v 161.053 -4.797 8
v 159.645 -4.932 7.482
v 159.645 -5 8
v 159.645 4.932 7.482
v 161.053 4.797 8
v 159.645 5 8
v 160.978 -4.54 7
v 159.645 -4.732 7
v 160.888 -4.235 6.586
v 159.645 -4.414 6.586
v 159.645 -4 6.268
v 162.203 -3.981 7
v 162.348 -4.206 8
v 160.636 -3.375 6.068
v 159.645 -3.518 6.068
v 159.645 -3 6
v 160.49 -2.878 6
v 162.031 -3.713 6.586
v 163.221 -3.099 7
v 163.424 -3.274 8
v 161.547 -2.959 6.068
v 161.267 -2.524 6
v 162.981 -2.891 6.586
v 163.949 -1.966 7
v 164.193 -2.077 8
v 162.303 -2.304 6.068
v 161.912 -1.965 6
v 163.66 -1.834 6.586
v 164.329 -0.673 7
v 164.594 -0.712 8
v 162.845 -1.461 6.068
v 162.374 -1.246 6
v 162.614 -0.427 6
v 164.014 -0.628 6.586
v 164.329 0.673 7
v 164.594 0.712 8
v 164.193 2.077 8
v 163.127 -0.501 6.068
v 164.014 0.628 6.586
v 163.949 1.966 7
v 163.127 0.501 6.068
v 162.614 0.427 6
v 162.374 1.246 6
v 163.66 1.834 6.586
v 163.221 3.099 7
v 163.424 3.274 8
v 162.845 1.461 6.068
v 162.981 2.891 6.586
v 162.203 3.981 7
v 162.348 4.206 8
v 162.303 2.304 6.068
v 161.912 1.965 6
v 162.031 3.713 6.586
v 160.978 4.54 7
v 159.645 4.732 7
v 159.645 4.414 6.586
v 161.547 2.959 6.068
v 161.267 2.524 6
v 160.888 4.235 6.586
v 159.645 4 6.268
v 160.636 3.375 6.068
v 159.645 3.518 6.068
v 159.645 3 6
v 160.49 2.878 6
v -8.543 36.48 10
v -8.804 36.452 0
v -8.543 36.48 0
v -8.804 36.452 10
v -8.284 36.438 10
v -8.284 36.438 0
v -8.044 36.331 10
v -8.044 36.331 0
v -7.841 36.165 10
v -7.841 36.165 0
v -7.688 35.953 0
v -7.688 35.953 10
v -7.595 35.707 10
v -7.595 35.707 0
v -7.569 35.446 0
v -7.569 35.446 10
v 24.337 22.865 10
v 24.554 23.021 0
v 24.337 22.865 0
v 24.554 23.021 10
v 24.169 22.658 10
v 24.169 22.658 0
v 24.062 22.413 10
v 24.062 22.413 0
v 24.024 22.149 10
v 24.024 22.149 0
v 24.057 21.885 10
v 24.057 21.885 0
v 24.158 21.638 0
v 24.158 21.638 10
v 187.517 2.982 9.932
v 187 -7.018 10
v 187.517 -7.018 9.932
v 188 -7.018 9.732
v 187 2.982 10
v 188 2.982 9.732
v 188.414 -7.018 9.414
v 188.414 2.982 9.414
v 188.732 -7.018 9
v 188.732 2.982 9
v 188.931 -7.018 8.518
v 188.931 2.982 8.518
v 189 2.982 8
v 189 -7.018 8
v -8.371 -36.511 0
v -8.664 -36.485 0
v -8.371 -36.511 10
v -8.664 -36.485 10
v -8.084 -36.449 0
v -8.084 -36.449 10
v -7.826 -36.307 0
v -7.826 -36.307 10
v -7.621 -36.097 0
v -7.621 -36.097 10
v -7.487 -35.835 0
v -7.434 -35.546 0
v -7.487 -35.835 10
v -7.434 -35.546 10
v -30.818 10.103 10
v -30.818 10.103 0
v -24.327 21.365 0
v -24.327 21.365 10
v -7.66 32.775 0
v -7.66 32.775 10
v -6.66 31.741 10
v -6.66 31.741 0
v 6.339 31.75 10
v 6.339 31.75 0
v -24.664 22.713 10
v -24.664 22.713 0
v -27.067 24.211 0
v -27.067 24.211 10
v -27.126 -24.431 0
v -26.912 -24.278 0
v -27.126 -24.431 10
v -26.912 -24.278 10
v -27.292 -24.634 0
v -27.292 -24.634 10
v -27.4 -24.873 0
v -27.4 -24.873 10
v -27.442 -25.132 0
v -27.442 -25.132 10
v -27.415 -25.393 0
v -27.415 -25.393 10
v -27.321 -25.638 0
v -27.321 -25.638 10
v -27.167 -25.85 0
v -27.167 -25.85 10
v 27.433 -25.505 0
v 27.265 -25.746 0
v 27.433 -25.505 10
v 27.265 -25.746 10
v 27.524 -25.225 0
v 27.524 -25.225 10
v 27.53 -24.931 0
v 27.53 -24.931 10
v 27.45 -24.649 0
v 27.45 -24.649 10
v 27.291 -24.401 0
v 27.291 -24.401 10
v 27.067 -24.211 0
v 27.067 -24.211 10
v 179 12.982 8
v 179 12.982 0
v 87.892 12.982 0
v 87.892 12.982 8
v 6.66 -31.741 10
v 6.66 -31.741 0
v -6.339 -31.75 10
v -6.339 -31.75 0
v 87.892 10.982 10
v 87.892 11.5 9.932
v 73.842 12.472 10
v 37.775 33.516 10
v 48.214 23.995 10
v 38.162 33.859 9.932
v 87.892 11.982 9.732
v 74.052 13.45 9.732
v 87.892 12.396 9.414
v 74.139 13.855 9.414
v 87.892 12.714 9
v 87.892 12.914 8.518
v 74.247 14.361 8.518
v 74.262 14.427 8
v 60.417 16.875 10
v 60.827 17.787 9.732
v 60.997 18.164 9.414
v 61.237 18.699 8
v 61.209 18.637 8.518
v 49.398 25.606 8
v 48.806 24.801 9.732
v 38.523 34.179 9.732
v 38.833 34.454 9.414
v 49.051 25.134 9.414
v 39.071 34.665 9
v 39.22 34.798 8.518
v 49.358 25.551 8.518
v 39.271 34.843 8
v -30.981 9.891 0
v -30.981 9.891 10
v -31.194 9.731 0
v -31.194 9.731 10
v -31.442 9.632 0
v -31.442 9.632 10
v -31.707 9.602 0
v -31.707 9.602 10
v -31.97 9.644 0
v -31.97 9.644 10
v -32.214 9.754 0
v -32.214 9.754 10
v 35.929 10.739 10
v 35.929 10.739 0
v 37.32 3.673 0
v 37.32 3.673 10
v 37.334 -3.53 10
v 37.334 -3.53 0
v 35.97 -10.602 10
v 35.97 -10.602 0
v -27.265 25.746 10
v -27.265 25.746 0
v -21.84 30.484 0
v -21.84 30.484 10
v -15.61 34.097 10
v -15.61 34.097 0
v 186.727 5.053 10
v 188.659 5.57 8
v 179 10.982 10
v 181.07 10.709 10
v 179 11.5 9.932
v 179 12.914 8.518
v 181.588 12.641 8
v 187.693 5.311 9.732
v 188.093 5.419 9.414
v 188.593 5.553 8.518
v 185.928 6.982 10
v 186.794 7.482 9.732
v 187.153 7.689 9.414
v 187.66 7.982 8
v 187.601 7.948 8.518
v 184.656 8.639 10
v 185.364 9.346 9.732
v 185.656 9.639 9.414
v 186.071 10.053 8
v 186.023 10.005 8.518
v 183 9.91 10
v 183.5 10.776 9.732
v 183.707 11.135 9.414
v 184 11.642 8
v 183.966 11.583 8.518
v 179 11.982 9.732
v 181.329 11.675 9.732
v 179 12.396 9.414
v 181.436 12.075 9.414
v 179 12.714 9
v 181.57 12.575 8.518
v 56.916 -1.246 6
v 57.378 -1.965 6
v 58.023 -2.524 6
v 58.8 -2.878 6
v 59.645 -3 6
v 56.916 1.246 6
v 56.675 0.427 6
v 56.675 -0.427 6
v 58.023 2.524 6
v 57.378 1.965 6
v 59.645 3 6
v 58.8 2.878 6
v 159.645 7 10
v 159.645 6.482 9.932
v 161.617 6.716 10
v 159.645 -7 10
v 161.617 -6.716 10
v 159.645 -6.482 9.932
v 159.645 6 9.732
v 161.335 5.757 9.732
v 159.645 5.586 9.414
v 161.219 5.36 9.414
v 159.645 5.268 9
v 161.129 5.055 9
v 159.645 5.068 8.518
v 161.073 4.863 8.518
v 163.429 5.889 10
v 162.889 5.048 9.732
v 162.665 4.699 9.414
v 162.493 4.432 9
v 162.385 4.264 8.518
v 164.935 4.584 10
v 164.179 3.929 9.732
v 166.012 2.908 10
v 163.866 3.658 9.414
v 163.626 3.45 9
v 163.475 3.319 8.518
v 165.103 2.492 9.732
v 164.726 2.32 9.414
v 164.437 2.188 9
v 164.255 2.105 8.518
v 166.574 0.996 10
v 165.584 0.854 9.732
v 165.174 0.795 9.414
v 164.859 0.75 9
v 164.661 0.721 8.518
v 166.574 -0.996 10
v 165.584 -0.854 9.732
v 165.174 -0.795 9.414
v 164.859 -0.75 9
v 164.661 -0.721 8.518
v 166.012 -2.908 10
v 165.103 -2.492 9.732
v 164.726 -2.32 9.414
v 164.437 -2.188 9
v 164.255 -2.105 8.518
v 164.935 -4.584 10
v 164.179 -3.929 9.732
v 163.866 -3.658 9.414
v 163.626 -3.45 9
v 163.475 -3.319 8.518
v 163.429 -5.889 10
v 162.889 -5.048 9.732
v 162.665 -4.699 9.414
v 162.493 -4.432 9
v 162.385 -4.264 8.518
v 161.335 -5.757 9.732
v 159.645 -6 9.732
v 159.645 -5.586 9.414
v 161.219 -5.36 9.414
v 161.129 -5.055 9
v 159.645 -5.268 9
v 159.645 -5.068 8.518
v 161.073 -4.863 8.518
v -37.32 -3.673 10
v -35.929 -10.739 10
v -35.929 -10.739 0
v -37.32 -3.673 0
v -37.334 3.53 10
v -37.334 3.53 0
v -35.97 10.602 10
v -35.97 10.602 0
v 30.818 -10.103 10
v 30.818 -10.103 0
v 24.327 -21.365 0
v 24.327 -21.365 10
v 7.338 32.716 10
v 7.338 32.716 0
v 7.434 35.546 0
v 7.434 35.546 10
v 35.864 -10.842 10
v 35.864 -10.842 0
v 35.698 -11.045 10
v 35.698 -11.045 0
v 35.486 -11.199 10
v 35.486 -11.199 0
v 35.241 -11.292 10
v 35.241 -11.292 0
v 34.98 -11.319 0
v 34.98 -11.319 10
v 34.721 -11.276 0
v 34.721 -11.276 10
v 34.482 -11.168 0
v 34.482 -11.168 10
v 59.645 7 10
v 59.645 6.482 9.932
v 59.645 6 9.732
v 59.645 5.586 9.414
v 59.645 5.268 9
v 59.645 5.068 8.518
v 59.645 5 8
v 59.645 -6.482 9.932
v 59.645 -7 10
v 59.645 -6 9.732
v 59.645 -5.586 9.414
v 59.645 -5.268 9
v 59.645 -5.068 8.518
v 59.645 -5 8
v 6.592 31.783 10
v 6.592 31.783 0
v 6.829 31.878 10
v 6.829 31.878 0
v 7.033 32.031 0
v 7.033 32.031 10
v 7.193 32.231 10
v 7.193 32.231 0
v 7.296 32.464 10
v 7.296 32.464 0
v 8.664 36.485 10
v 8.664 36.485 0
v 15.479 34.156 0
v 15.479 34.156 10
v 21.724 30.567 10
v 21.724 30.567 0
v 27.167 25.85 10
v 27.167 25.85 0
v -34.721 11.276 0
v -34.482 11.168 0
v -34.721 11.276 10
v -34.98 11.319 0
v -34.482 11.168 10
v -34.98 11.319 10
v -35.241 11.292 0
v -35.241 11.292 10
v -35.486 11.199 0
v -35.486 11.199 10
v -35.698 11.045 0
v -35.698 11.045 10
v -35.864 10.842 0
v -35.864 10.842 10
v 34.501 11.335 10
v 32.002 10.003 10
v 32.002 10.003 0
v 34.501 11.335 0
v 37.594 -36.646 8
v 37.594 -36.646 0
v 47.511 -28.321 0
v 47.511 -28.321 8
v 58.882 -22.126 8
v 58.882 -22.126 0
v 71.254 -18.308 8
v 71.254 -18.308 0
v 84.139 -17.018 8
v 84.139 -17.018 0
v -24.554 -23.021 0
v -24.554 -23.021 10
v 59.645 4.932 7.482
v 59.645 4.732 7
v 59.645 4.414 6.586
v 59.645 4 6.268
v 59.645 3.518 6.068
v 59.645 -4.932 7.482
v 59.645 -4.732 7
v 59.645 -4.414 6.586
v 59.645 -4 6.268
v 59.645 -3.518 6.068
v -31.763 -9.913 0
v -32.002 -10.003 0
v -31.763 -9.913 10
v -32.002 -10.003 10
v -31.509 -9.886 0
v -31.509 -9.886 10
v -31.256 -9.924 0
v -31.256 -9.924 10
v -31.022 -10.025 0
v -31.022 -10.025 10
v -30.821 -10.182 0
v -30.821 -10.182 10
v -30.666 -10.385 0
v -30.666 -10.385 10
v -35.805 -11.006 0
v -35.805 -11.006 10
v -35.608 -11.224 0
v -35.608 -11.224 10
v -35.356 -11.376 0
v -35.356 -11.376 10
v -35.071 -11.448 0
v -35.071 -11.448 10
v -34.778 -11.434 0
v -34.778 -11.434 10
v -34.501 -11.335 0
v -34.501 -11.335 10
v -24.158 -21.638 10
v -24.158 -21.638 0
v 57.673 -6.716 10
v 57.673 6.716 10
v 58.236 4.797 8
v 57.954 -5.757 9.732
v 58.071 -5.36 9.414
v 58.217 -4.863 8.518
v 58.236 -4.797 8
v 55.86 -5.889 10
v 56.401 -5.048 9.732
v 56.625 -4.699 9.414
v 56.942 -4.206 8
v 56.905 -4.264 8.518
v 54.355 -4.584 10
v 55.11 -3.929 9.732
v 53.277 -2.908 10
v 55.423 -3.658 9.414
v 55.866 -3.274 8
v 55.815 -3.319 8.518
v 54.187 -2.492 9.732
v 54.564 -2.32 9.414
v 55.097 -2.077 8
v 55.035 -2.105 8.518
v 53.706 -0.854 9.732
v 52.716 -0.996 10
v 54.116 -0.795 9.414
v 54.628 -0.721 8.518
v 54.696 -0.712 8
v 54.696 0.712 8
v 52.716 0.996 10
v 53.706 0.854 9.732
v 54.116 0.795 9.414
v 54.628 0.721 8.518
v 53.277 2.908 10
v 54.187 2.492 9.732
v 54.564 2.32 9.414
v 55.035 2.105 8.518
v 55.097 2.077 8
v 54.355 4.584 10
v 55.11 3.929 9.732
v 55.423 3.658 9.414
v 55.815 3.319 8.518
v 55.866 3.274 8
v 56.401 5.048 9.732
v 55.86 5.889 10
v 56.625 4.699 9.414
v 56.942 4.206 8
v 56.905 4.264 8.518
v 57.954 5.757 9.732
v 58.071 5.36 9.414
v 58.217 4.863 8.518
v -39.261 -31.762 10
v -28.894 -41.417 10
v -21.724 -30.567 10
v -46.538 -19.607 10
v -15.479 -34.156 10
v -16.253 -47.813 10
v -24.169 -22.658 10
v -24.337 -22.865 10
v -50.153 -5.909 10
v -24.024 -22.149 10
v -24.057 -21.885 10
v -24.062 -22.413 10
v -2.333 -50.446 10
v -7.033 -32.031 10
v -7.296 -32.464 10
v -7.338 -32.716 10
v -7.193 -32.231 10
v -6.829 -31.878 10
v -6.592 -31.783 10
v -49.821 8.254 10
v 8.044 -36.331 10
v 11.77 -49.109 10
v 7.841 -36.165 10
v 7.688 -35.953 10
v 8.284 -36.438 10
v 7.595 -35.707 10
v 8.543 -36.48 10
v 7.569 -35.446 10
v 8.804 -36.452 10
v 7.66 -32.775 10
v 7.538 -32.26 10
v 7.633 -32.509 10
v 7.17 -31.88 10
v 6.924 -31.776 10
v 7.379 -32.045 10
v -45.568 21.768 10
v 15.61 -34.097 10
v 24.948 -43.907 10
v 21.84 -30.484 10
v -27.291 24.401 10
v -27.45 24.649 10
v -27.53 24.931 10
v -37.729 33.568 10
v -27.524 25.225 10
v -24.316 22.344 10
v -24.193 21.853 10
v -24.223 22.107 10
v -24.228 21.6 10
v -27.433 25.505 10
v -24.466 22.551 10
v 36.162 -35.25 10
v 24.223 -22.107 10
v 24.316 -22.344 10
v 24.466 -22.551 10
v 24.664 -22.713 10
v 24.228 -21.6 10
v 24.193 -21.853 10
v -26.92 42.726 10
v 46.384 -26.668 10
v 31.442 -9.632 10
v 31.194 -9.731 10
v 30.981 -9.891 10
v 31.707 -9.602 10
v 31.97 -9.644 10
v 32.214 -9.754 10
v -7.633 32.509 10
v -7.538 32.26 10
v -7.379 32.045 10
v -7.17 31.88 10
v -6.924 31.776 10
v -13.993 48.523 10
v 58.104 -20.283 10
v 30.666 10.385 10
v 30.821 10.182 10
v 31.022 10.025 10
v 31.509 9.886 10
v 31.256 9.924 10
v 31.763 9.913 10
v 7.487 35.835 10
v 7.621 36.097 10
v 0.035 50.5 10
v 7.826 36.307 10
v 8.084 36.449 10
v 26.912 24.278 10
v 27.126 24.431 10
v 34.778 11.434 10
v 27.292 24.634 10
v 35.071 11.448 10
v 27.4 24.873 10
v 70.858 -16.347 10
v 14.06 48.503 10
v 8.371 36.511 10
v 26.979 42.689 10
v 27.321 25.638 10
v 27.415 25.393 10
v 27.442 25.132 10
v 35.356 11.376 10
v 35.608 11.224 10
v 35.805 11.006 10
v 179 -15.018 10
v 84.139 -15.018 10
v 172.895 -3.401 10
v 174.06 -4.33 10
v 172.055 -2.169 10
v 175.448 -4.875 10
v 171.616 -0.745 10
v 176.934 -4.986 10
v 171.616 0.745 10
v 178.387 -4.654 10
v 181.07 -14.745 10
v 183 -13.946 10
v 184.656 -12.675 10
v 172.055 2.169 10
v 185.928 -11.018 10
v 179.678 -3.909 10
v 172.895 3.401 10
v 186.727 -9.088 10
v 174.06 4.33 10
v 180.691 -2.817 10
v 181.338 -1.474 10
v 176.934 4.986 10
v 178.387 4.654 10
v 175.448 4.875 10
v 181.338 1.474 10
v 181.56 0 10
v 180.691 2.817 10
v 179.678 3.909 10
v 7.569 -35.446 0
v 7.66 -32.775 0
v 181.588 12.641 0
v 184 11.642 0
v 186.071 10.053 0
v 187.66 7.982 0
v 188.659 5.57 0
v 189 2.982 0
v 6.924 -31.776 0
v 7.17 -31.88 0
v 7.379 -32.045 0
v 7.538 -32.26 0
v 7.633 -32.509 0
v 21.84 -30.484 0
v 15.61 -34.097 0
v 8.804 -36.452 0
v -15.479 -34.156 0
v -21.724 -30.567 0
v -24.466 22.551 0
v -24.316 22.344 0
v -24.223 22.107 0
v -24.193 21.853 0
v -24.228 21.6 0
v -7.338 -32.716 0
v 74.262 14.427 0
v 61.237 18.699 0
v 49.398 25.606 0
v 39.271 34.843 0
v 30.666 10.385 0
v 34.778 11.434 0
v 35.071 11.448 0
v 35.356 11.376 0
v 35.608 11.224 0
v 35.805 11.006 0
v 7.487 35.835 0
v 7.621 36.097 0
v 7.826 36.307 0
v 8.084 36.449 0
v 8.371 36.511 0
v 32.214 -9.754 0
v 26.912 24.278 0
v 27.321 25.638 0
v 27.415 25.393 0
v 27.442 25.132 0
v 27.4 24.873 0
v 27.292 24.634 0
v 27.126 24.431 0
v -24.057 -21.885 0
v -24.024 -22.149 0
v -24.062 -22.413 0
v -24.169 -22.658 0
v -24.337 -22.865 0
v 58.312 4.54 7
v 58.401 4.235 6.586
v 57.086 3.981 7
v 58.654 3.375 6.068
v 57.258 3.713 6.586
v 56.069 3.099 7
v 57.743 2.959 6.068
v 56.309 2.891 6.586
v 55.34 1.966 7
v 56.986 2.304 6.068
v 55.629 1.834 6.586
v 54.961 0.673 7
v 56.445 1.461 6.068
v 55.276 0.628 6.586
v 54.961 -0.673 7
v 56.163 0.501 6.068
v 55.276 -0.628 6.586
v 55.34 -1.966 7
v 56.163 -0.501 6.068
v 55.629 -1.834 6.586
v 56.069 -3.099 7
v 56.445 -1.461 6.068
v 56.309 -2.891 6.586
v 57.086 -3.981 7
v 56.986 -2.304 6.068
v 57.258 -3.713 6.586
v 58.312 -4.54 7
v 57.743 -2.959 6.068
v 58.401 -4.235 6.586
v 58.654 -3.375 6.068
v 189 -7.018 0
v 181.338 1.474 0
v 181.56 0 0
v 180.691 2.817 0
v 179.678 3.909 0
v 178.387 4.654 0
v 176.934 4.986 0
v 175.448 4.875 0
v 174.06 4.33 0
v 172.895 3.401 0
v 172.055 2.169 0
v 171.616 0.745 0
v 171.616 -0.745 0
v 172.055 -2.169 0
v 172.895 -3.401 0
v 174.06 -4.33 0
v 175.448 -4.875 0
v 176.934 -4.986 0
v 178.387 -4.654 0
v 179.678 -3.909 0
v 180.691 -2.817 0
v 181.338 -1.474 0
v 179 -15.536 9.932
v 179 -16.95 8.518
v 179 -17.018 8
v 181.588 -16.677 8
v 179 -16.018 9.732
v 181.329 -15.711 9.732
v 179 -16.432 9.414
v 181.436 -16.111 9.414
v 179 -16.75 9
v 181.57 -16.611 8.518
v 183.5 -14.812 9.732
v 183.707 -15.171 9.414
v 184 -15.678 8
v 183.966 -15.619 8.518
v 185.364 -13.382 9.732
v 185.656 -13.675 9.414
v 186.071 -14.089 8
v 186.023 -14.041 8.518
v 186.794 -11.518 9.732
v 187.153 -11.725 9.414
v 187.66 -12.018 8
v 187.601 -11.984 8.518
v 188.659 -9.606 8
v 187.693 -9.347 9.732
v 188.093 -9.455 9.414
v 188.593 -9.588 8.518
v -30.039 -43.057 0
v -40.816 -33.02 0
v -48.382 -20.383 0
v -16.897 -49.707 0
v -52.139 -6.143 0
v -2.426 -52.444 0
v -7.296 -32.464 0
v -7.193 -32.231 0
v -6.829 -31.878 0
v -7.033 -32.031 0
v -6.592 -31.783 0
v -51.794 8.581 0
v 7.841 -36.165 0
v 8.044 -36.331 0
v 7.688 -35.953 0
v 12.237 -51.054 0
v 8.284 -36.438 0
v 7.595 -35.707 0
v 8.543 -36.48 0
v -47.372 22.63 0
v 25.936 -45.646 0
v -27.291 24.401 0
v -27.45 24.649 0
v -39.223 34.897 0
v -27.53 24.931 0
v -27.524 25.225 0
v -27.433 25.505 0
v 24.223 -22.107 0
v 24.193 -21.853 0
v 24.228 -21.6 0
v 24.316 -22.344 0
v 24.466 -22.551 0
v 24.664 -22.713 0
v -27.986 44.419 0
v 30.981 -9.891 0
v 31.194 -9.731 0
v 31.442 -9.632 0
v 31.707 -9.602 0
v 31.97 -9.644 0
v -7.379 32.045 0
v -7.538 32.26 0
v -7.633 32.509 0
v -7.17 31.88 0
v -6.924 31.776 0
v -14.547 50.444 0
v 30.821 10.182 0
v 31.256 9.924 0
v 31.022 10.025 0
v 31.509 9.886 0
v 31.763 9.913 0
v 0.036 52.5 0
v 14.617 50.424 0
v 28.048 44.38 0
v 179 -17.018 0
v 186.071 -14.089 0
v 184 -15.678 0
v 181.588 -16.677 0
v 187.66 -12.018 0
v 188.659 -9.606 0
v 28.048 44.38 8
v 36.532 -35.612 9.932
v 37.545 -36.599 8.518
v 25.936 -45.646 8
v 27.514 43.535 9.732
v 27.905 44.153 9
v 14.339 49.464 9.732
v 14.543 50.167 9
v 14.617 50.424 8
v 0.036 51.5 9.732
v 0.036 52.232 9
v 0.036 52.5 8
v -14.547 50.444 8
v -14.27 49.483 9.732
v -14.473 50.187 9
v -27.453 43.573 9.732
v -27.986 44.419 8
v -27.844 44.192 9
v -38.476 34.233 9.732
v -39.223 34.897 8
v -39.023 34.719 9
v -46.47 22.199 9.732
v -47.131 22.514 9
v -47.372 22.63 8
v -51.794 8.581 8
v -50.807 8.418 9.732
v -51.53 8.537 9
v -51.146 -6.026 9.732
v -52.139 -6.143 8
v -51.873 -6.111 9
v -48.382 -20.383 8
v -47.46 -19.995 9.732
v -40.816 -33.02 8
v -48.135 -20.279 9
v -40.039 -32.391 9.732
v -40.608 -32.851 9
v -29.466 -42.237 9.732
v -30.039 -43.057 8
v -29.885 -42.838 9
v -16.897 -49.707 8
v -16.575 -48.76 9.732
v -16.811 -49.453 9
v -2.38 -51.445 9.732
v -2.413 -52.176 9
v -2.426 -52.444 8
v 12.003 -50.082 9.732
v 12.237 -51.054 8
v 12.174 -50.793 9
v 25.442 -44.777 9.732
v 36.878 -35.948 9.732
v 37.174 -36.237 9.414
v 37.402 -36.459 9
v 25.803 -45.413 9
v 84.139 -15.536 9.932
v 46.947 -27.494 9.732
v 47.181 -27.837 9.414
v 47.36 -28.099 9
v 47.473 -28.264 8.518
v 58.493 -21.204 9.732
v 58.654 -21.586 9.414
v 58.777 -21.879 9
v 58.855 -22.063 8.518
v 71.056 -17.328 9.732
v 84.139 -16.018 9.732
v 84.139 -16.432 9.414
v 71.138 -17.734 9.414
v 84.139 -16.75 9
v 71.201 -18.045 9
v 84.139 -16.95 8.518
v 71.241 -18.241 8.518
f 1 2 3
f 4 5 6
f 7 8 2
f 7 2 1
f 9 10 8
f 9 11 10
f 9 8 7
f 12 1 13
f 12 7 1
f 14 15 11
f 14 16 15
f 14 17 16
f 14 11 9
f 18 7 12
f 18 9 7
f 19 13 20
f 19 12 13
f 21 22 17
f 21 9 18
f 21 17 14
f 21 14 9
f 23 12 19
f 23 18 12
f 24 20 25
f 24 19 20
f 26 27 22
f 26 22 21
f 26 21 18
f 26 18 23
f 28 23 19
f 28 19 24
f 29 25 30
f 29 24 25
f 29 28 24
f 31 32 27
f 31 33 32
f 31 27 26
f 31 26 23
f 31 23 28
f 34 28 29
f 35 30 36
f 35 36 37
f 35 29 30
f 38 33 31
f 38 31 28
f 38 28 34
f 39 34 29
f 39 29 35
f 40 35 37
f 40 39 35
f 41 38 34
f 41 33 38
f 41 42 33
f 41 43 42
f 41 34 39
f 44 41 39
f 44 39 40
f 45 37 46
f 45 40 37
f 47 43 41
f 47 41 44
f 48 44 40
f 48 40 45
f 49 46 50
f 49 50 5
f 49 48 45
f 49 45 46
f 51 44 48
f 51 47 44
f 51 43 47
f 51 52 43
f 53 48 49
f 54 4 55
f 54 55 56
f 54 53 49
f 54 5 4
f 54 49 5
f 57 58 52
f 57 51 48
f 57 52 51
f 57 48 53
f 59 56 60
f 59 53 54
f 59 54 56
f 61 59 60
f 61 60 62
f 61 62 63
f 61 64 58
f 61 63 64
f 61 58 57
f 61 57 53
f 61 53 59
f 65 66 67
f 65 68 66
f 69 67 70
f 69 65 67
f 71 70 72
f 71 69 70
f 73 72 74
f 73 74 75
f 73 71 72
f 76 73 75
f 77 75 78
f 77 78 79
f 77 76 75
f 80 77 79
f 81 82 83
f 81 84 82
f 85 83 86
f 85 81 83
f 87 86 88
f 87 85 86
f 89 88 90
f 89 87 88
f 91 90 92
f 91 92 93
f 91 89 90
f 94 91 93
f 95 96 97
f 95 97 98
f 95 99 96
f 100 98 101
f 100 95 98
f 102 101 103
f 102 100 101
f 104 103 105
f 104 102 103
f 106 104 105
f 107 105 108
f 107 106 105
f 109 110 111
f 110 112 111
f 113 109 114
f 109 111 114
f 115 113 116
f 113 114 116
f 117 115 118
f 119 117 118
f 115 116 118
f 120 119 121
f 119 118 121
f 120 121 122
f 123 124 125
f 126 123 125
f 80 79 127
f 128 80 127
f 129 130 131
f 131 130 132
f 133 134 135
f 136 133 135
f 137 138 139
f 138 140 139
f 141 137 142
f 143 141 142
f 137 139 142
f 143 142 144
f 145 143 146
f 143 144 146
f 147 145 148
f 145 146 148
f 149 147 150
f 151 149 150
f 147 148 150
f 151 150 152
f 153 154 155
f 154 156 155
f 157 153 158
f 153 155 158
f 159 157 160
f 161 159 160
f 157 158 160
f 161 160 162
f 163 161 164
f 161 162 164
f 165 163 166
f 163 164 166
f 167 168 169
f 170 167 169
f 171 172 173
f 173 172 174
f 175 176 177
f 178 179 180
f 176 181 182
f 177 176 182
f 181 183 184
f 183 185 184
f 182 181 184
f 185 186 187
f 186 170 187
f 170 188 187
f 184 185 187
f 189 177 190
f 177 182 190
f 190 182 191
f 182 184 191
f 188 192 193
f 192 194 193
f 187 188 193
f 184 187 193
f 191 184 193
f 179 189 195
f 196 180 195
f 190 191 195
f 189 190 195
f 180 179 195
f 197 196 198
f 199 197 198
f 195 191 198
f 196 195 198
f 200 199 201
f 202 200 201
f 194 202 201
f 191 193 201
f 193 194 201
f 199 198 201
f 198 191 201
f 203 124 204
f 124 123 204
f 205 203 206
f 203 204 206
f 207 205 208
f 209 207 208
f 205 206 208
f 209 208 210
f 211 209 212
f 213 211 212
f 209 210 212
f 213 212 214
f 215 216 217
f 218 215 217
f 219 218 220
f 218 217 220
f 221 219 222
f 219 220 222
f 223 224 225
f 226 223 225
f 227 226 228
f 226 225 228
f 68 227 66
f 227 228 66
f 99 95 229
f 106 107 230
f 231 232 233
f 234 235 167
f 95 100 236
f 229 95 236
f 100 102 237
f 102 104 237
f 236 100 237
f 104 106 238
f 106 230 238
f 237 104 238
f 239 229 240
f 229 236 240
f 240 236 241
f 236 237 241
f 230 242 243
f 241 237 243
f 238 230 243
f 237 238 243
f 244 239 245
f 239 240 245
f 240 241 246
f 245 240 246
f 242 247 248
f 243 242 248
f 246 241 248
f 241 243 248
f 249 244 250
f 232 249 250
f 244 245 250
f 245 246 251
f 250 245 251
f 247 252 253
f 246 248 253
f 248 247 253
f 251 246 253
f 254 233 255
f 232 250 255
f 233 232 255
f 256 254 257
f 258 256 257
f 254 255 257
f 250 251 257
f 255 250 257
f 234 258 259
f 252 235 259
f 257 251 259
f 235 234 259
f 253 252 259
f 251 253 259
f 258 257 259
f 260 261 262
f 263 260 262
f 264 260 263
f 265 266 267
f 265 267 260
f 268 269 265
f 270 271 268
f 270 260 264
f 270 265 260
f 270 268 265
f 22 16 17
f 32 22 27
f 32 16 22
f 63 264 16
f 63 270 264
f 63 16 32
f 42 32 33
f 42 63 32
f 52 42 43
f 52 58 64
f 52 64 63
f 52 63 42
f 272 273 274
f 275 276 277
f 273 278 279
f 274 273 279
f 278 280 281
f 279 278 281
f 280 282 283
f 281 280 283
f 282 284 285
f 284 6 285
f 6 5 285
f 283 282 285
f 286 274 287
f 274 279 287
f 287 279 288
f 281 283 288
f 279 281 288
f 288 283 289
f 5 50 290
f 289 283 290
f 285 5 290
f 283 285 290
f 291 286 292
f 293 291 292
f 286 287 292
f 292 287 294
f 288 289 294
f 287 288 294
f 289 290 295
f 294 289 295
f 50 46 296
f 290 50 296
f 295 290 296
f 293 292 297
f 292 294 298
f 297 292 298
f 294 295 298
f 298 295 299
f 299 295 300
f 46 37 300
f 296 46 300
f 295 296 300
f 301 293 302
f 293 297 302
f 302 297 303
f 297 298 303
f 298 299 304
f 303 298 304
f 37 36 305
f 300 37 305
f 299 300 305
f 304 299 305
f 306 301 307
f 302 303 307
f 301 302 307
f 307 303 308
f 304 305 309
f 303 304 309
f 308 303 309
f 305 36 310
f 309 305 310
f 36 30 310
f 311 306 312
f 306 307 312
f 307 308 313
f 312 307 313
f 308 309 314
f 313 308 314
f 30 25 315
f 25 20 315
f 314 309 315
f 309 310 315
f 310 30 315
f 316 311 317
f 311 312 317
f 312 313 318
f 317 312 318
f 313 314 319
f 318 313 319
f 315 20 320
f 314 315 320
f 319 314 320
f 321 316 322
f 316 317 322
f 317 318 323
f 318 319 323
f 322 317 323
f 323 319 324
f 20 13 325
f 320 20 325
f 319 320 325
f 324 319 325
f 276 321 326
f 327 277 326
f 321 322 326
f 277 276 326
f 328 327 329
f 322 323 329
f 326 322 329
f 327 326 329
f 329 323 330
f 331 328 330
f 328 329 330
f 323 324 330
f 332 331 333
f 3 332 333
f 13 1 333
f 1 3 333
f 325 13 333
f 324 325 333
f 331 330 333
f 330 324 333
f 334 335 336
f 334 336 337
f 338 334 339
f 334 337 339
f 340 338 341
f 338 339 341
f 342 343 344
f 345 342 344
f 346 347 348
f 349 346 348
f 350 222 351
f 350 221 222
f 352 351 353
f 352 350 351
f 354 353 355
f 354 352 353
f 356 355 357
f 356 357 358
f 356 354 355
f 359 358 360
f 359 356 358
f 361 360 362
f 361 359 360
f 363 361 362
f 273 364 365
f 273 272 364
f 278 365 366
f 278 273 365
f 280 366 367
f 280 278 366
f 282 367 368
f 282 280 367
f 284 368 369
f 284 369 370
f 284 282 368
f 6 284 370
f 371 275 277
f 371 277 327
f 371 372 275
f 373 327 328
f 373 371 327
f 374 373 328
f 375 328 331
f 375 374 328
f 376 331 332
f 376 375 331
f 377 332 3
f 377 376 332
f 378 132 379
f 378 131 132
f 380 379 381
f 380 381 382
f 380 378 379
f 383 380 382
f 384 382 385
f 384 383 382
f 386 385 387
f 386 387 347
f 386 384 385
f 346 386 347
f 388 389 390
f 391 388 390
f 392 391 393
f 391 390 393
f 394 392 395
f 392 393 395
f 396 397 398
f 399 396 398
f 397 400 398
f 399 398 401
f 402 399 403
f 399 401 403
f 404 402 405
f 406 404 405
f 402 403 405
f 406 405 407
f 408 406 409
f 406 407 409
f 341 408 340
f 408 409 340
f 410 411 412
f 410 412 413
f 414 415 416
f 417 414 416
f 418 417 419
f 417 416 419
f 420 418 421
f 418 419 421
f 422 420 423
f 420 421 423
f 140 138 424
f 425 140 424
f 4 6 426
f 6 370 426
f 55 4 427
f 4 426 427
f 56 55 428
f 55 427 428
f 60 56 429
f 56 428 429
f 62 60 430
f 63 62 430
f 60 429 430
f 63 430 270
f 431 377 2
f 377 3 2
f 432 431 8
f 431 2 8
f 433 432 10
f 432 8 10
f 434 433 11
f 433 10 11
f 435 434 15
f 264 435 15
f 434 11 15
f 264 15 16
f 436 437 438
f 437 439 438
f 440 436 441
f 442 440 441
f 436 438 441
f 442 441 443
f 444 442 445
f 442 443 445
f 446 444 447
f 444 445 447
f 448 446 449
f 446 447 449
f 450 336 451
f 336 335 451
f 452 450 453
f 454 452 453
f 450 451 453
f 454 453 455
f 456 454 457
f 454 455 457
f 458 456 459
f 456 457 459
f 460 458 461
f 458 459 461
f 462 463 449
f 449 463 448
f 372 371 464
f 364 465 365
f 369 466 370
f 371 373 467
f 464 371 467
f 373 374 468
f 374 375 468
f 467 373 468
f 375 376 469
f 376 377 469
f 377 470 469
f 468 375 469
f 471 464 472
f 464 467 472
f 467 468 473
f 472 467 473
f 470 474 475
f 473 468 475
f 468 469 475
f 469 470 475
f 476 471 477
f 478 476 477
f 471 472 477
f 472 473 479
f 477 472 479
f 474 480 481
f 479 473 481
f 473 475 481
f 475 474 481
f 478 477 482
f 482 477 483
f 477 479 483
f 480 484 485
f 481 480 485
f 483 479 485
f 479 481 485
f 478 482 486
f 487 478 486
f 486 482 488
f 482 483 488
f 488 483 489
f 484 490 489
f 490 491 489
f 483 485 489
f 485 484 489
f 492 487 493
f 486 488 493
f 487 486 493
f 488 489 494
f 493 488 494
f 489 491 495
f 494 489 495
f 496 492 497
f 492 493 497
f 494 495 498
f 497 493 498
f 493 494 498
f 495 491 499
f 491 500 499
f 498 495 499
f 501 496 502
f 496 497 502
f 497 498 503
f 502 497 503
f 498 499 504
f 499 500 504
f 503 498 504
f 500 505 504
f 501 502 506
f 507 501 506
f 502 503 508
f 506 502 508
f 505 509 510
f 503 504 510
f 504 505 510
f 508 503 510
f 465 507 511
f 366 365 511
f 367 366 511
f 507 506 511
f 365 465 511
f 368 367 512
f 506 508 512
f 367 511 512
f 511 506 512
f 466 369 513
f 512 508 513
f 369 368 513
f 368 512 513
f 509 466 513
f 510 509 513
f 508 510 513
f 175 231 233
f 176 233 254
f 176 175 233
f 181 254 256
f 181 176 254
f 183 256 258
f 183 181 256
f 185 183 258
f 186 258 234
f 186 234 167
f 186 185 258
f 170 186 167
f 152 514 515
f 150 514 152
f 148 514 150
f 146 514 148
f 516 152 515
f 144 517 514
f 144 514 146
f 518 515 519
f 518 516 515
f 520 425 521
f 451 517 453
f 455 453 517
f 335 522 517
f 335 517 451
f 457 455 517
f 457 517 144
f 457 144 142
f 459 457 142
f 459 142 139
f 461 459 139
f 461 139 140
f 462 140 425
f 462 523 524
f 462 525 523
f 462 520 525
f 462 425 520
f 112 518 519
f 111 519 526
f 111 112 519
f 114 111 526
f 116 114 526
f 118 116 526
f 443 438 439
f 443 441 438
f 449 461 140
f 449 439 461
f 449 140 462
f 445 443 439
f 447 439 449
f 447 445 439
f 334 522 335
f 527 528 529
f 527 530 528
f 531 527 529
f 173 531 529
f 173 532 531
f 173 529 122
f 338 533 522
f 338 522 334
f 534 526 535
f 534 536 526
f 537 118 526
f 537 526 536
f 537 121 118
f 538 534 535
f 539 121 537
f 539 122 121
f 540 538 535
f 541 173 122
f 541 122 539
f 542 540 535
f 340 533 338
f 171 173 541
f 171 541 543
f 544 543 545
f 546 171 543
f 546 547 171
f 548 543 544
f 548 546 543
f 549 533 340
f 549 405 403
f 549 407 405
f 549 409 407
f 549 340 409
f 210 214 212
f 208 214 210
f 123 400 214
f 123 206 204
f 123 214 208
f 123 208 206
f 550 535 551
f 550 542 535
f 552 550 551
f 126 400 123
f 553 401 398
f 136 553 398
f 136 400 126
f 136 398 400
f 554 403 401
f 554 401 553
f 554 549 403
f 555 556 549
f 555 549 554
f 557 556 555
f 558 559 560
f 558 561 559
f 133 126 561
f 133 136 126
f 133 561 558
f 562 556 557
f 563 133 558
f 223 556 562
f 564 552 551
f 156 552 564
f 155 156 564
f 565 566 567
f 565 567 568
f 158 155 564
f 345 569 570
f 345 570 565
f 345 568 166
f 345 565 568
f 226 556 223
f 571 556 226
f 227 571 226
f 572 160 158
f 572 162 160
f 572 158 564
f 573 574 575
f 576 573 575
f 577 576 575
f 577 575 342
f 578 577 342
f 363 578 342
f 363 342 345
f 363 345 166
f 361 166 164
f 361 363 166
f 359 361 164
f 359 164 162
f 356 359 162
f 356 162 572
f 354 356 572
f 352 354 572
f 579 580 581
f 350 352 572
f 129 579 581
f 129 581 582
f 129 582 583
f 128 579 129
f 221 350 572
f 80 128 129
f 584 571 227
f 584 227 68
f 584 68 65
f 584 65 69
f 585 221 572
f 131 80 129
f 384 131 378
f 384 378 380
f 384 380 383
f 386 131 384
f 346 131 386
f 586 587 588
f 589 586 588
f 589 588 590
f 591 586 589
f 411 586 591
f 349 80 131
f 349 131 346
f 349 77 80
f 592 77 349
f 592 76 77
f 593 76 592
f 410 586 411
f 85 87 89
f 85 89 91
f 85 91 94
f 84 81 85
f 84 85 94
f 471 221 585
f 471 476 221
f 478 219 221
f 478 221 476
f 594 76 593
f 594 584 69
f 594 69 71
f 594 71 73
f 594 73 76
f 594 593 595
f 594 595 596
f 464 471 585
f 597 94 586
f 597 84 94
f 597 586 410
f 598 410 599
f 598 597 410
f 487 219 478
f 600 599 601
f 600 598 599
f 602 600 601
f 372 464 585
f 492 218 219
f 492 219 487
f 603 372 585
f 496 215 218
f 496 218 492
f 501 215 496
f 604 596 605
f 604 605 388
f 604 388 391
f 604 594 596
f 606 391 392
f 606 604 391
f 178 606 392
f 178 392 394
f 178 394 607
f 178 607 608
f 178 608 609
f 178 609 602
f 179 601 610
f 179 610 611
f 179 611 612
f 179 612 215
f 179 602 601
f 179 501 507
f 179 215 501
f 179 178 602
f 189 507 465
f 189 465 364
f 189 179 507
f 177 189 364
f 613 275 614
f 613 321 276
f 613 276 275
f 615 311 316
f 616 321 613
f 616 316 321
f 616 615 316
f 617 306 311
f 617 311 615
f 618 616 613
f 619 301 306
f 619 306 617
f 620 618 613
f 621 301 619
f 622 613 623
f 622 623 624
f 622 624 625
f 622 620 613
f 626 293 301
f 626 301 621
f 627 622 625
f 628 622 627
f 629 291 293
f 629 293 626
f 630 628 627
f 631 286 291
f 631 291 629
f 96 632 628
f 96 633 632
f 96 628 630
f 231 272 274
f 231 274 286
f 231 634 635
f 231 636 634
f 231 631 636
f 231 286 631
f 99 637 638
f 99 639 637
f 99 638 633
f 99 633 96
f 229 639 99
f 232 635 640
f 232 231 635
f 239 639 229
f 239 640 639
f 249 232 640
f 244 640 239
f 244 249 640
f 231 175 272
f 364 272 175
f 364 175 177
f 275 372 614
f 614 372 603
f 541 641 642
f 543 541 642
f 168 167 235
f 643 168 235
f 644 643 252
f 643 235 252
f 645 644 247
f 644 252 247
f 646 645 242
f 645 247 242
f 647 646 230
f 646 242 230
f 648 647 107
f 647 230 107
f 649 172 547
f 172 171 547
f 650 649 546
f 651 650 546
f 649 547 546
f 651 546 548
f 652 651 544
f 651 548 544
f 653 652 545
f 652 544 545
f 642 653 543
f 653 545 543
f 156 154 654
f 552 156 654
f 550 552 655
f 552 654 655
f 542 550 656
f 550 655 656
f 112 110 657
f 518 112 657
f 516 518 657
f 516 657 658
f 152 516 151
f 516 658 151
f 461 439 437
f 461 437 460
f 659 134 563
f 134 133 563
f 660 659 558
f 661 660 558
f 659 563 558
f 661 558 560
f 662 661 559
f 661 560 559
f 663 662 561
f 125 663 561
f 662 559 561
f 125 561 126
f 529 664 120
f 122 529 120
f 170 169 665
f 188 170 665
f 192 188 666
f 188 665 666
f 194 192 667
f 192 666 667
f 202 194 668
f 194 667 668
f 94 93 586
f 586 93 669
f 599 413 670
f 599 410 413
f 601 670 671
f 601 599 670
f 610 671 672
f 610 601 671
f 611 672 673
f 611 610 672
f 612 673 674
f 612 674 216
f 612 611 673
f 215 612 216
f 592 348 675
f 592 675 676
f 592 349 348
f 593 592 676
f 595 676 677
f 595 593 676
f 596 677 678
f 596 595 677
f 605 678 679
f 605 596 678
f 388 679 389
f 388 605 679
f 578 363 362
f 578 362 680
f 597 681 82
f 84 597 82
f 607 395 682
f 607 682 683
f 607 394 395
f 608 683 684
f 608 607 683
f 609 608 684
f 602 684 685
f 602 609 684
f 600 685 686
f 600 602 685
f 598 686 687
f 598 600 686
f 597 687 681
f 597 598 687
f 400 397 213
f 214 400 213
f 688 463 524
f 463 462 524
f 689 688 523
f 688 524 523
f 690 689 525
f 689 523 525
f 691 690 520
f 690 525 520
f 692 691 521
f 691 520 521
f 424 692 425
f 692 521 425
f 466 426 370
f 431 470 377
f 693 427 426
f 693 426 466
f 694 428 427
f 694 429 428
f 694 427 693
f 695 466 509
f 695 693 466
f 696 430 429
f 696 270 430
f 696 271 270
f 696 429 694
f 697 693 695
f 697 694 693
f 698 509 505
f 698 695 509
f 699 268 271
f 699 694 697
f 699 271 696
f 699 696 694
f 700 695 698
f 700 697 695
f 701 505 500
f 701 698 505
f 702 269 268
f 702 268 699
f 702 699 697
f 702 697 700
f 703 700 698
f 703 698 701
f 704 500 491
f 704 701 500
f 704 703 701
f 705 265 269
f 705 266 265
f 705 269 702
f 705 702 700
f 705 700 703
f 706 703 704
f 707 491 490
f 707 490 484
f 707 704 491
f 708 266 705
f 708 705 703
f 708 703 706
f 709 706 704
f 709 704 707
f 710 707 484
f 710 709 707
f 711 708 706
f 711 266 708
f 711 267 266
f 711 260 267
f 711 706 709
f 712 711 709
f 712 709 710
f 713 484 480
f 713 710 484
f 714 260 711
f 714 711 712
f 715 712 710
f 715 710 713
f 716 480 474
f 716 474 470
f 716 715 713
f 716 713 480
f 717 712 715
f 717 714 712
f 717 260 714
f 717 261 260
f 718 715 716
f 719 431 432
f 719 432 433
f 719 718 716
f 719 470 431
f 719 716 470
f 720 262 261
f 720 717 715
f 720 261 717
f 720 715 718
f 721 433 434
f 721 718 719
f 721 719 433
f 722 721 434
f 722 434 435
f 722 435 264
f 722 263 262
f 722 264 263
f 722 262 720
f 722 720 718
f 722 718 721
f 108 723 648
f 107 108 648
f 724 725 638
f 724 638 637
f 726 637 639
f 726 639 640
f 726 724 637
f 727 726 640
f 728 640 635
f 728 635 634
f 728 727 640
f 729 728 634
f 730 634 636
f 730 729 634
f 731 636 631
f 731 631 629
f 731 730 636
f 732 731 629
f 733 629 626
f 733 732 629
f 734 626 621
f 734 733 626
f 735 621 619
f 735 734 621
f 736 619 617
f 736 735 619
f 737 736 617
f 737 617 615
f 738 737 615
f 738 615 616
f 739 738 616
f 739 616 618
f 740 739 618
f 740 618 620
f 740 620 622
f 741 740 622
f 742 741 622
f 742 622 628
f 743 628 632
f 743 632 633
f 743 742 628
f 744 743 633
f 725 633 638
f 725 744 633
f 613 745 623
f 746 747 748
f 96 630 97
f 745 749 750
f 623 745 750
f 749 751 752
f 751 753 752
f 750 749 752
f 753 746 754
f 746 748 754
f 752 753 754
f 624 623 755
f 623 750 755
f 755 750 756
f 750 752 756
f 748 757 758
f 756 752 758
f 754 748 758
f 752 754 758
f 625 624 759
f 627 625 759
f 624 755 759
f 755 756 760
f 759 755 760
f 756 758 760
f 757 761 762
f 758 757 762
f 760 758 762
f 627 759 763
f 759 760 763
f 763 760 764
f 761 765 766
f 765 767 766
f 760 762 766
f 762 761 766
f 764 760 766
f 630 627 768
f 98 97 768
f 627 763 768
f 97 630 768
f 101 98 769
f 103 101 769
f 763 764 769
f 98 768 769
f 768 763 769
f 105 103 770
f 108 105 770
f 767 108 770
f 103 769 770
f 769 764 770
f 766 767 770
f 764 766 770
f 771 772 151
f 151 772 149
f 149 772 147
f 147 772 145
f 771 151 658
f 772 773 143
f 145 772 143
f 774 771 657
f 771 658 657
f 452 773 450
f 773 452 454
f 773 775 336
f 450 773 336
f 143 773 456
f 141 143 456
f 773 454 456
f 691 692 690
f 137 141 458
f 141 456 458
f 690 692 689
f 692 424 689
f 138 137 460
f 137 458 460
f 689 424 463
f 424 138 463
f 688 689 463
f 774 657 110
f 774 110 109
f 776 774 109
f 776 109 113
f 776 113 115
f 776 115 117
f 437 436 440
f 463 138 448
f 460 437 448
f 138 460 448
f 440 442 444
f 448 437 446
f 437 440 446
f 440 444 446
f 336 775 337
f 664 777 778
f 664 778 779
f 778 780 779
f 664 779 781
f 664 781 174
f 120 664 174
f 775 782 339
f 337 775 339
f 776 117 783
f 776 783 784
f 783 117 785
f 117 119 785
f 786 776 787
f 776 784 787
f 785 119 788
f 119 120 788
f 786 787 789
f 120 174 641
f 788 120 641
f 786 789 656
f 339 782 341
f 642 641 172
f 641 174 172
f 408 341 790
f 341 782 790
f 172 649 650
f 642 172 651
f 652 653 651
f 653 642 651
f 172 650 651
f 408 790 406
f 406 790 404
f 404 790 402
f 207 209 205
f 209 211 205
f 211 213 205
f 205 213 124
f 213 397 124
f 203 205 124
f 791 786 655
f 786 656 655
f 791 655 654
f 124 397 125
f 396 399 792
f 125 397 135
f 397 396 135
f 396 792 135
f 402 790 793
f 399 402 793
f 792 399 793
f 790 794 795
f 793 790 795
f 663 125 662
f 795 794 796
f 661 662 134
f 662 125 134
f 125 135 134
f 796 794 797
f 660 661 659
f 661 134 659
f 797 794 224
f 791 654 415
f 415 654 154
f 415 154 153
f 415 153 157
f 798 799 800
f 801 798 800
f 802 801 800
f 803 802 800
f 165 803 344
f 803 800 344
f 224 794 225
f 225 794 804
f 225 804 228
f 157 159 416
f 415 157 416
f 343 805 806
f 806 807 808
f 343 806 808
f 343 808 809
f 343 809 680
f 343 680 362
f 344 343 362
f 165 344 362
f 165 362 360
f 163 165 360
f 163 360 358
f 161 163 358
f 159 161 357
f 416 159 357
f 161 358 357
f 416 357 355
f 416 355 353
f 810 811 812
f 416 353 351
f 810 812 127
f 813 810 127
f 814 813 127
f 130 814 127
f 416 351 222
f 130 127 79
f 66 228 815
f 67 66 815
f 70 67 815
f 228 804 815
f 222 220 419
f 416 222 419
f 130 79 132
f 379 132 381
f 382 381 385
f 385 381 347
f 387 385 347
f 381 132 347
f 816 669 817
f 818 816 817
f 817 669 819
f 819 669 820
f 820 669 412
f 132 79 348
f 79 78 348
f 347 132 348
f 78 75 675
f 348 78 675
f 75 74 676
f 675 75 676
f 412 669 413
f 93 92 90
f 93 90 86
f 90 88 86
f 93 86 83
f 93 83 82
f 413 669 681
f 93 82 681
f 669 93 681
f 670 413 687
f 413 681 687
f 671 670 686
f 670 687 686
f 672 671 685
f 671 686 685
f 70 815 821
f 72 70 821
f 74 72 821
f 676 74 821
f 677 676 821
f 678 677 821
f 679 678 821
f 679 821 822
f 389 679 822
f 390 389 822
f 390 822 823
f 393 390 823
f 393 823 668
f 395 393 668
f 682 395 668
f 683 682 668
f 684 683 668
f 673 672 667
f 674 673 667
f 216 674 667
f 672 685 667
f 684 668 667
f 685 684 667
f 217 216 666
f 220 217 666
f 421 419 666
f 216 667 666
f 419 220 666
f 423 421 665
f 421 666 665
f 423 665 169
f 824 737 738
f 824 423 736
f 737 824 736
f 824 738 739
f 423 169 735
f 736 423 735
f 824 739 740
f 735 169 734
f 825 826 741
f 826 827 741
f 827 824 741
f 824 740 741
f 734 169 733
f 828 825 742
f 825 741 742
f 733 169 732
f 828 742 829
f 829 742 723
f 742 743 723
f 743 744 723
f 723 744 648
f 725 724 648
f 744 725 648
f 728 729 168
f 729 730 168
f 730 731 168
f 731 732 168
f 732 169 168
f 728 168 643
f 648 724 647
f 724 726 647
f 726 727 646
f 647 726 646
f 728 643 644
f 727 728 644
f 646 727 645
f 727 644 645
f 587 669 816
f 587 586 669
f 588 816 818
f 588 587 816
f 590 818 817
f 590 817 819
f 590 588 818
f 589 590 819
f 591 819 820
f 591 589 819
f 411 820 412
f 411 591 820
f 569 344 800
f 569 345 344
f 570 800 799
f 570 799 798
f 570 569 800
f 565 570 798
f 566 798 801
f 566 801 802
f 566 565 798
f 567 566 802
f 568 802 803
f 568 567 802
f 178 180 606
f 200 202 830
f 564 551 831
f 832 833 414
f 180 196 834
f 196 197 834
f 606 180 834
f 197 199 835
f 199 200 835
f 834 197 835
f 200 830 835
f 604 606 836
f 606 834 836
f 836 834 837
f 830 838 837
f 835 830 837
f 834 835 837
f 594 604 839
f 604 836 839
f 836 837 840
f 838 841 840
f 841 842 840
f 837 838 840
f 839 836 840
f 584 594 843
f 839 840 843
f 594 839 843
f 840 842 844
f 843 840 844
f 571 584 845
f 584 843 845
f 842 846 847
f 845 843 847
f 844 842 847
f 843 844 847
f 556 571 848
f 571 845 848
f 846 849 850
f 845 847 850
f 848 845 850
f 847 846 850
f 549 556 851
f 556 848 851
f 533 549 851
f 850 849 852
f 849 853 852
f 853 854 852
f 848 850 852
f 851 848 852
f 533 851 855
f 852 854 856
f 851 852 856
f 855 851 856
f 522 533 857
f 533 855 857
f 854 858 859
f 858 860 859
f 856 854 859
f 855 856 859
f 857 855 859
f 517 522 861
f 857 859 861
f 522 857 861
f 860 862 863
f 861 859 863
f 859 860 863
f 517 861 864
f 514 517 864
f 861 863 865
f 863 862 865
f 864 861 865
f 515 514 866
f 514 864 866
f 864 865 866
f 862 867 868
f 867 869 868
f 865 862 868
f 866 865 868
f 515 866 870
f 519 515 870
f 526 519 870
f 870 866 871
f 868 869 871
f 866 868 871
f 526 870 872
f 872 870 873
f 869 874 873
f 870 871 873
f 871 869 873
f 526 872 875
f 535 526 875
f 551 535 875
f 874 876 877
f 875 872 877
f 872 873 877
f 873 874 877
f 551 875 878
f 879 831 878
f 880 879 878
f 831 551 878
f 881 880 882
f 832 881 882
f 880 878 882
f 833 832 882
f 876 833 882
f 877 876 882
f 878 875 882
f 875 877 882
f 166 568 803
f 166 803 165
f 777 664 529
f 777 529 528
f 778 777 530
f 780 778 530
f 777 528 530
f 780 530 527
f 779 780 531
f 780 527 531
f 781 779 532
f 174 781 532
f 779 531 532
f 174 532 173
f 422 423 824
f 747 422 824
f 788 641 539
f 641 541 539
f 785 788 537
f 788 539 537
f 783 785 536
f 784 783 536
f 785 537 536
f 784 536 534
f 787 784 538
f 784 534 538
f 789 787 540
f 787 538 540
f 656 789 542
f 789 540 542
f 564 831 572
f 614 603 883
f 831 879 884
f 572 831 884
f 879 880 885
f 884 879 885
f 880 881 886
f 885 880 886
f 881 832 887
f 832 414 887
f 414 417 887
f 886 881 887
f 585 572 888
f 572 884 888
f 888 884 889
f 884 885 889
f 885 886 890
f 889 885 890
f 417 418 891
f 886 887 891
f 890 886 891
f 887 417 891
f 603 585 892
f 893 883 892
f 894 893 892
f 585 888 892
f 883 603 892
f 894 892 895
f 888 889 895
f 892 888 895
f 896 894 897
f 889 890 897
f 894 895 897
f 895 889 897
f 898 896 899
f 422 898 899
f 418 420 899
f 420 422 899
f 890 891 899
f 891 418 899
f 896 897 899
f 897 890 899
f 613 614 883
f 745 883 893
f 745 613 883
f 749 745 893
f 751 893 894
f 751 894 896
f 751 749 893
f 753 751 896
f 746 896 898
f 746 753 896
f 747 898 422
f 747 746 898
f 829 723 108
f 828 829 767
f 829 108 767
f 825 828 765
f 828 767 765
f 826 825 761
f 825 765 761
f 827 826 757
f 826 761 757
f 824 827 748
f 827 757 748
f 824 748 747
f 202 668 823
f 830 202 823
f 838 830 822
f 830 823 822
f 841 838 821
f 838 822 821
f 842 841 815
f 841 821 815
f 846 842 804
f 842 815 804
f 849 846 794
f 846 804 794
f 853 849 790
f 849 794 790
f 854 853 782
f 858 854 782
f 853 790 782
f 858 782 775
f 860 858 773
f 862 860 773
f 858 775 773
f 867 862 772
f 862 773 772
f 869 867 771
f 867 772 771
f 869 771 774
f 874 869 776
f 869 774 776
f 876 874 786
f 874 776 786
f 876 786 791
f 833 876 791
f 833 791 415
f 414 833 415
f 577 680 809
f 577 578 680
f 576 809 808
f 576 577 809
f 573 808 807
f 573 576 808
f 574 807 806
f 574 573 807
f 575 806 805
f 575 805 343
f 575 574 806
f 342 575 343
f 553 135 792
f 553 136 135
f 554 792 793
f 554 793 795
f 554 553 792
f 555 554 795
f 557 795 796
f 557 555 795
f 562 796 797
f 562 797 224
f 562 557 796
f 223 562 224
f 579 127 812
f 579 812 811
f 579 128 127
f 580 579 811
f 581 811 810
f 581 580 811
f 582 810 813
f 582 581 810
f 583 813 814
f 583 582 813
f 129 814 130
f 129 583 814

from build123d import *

# Parameters (mm, degrees)
F0_R     = 5
F1_DEPTH = 10
F2_R     = 10
F3_R     = 1
F4_DEPTH = 6
F5_R     = 1.99999
F6_R     = 2


# Not quite as in the source:
# - a fillet or chamfer is up to 0.001 mm smaller than in the source, because OpenCascade refuses the exact size


with BuildPart() as f1:
    # F0 (on Top) → F1 (new body)
    with BuildSketch(Plane.XY):
        with BuildLine():
            ThreePointArc((87.8922518749, 12.982062427), (61.2373823548, 18.6986926605), (39.2710061569, 34.8430491695))
            ThreePointArc((39.2710061569, 34.8430491695), (-52.4855584858, 1.231320604), (37.5938529252, -36.6463125326))
            ThreePointArc((37.5938529252, -36.6463125326), (58.881501719, -22.1257192654), (84.1386232135, -17.017937573))
            Line((84.1386232135, -17.017937573), (188.9996444946, -17.017937573))
            Line((188.9996444946, -17.017937573), (188.9996444946, 12.982062427))
            Line((188.9996444946, 12.982062427), (87.8922518749, 12.982062427))
        make_face()
        with BuildLine():
            ThreePointArc((-28.0871828778, 24.8467333464), (-18.7727000217, 32.4628361961), (-7.5256854941, 36.7370937588))
            Line((-7.5256854941, 36.7370937588), (-7.6951050263, 31.7399648809))
            Line((-7.6951050263, 31.7399648809), (7.3048913079, 31.7504516883))
            Line((7.3048913079, 31.7504516883), (7.4743108401, 36.7475805661))
            ThreePointArc((7.4743108401, 36.7475805661), (18.7272908139, 32.4890532145), (28.0524137093, 24.8859816982))
            Line((28.0524137093, 24.8859816982), (23.6400633889, 22.5341388781))
            Line((23.6400633889, 22.5341388781), (31.1491433976, 9.5490043996))
            Line((31.1491433976, 9.5490043996), (35.561493718, 11.9008472197))
            ThreePointArc((35.561493718, 11.9008472197), (37.4999908356, 0.0262170183), (35.5780992034, -11.8511120606))
            Line((35.5780992034, -11.8511120606), (31.3351684153, -9.2058260029))
            Line((31.3351684153, -9.2058260029), (23.8442520897, -22.2014472886))
            Line((23.8442520897, -22.2014472886), (28.0871828778, -24.8467333464))
            ThreePointArc((28.0871828778, -24.8467333464), (18.7727000217, -32.4628361961), (7.5256854941, -36.7370937588))
            Line((7.5256854941, -36.7370937588), (7.6951050263, -31.7399648809))
            Line((7.6951050263, -31.7399648809), (-7.3048913079, -31.7504516883))
            Line((-7.3048913079, -31.7504516883), (-7.4743108401, -36.7475805661))
            ThreePointArc((-7.4743108401, -36.7475805661), (-18.7272908139, -32.4890532145), (-28.0524137093, -24.8859816982))
            Line((-28.0524137093, -24.8859816982), (-23.6400633889, -22.5341388781))
            Line((-23.6400633889, -22.5341388781), (-31.1491433976, -9.5490043996))
            Line((-31.1491433976, -9.5490043996), (-35.561493718, -11.9008472197))
            ThreePointArc((-35.561493718, -11.9008472197), (-37.4999908356, -0.0262170183), (-35.5780992034, 11.8511120606))
            Line((-35.5780992034, 11.8511120606), (-31.3351684153, 9.2058260029))
            Line((-31.3351684153, 9.2058260029), (-23.8442520897, 22.2014472886))
            Line((-23.8442520897, 22.2014472886), (-28.0871828778, 24.8467333464))
        make_face(mode=Mode.SUBTRACT)
        with BuildLine():
            Line((159.6448034048, -5), (59.6448034048, -5))
            ThreePointArc((59.6448034048, -5), (54.6448034048, 0), (59.6448034048, 5))
            Line((59.6448034048, 5), (159.6448034048, 5))
            ThreePointArc((159.6448034048, 5), (164.6448034048, 0), (159.6448034048, -5))
        make_face(mode=Mode.SUBTRACT)
        with Locations((176.5601634979, 0)):
            Circle(F0_R, mode=Mode.SUBTRACT)
    extrude(amount=F1_DEPTH)

    # F2
    f2_edges = [f1.edges().sort_by_distance(p)[0] for p in [
        (188.999644, 12.982062, 5),
        (188.999644, -17.017938, 5),
    ]]
    fillet(f2_edges, radius=F2_R)

    # F3
    f3_edges = [f1.edges().sort_by_distance(p)[0] for p in [
        (-7.525685, 36.737094, 5),
        (-7.695105, 31.739965, 5),
        (7.304891, 31.750452, 5),
        (7.474311, 36.747581, 5),
        (23.640063, 22.534139, 5),
        (28.052414, 24.885982, 5),
        (31.149143, 9.549004, 5),
        (35.561494, 11.900847, 5),
        (35.578099, -11.851112, 5),
        (31.335168, -9.205826, 5),
        (23.844252, -22.201447, 5),
        (28.087183, -24.846733, 5),
        (7.525685, -36.737094, 5),
        (7.695105, -31.739965, 5),
        (-7.304891, -31.750452, 5),
        (-7.474311, -36.747581, 5),
        (-28.052414, -24.885982, 5),
        (-23.640063, -22.534139, 5),
        (-31.149143, -9.549004, 5),
        (-35.561494, -11.900847, 5),
        (-35.578099, 11.851112, 5),
        (-31.335168, 9.205826, 5),
        (-23.844252, 22.201447, 5),
        (-28.087183, 24.846733, 5),
    ]]
    fillet(f3_edges, radius=F3_R)

    # F0 (on Top) → F4 (join)
    with BuildSketch(Plane.XY):
        with BuildLine():
            ThreePointArc((59.6448034048, 5), (54.6448034048, 0), (59.6448034048, -5))
            Line((59.6448034048, -5), (159.6448034048, -5))
            ThreePointArc((159.6448034048, -5), (164.6448034048, 0), (159.6448034048, 5))
            Line((159.6448034048, 5), (59.6448034048, 5))
        make_face()
    extrude(amount=F4_DEPTH)

    # F5 (radius 2 in the source; OpenCascade refuses exactly that, so slightly less here)
    f5_edges = [f1.edges().sort_by_distance(p)[0] for p in [
        (109.644803, 5, 6),
        (109.644803, 5, 10),
    ]]
    fillet(f5_edges, radius=F5_R)

    # F6
    f6_edges = [f1.edges().sort_by_distance(p)[0] for p in [
        (-52.485558, 1.231321, 10),
    ]]
    fillet(f6_edges, radius=F6_R)


solid = f1.part
